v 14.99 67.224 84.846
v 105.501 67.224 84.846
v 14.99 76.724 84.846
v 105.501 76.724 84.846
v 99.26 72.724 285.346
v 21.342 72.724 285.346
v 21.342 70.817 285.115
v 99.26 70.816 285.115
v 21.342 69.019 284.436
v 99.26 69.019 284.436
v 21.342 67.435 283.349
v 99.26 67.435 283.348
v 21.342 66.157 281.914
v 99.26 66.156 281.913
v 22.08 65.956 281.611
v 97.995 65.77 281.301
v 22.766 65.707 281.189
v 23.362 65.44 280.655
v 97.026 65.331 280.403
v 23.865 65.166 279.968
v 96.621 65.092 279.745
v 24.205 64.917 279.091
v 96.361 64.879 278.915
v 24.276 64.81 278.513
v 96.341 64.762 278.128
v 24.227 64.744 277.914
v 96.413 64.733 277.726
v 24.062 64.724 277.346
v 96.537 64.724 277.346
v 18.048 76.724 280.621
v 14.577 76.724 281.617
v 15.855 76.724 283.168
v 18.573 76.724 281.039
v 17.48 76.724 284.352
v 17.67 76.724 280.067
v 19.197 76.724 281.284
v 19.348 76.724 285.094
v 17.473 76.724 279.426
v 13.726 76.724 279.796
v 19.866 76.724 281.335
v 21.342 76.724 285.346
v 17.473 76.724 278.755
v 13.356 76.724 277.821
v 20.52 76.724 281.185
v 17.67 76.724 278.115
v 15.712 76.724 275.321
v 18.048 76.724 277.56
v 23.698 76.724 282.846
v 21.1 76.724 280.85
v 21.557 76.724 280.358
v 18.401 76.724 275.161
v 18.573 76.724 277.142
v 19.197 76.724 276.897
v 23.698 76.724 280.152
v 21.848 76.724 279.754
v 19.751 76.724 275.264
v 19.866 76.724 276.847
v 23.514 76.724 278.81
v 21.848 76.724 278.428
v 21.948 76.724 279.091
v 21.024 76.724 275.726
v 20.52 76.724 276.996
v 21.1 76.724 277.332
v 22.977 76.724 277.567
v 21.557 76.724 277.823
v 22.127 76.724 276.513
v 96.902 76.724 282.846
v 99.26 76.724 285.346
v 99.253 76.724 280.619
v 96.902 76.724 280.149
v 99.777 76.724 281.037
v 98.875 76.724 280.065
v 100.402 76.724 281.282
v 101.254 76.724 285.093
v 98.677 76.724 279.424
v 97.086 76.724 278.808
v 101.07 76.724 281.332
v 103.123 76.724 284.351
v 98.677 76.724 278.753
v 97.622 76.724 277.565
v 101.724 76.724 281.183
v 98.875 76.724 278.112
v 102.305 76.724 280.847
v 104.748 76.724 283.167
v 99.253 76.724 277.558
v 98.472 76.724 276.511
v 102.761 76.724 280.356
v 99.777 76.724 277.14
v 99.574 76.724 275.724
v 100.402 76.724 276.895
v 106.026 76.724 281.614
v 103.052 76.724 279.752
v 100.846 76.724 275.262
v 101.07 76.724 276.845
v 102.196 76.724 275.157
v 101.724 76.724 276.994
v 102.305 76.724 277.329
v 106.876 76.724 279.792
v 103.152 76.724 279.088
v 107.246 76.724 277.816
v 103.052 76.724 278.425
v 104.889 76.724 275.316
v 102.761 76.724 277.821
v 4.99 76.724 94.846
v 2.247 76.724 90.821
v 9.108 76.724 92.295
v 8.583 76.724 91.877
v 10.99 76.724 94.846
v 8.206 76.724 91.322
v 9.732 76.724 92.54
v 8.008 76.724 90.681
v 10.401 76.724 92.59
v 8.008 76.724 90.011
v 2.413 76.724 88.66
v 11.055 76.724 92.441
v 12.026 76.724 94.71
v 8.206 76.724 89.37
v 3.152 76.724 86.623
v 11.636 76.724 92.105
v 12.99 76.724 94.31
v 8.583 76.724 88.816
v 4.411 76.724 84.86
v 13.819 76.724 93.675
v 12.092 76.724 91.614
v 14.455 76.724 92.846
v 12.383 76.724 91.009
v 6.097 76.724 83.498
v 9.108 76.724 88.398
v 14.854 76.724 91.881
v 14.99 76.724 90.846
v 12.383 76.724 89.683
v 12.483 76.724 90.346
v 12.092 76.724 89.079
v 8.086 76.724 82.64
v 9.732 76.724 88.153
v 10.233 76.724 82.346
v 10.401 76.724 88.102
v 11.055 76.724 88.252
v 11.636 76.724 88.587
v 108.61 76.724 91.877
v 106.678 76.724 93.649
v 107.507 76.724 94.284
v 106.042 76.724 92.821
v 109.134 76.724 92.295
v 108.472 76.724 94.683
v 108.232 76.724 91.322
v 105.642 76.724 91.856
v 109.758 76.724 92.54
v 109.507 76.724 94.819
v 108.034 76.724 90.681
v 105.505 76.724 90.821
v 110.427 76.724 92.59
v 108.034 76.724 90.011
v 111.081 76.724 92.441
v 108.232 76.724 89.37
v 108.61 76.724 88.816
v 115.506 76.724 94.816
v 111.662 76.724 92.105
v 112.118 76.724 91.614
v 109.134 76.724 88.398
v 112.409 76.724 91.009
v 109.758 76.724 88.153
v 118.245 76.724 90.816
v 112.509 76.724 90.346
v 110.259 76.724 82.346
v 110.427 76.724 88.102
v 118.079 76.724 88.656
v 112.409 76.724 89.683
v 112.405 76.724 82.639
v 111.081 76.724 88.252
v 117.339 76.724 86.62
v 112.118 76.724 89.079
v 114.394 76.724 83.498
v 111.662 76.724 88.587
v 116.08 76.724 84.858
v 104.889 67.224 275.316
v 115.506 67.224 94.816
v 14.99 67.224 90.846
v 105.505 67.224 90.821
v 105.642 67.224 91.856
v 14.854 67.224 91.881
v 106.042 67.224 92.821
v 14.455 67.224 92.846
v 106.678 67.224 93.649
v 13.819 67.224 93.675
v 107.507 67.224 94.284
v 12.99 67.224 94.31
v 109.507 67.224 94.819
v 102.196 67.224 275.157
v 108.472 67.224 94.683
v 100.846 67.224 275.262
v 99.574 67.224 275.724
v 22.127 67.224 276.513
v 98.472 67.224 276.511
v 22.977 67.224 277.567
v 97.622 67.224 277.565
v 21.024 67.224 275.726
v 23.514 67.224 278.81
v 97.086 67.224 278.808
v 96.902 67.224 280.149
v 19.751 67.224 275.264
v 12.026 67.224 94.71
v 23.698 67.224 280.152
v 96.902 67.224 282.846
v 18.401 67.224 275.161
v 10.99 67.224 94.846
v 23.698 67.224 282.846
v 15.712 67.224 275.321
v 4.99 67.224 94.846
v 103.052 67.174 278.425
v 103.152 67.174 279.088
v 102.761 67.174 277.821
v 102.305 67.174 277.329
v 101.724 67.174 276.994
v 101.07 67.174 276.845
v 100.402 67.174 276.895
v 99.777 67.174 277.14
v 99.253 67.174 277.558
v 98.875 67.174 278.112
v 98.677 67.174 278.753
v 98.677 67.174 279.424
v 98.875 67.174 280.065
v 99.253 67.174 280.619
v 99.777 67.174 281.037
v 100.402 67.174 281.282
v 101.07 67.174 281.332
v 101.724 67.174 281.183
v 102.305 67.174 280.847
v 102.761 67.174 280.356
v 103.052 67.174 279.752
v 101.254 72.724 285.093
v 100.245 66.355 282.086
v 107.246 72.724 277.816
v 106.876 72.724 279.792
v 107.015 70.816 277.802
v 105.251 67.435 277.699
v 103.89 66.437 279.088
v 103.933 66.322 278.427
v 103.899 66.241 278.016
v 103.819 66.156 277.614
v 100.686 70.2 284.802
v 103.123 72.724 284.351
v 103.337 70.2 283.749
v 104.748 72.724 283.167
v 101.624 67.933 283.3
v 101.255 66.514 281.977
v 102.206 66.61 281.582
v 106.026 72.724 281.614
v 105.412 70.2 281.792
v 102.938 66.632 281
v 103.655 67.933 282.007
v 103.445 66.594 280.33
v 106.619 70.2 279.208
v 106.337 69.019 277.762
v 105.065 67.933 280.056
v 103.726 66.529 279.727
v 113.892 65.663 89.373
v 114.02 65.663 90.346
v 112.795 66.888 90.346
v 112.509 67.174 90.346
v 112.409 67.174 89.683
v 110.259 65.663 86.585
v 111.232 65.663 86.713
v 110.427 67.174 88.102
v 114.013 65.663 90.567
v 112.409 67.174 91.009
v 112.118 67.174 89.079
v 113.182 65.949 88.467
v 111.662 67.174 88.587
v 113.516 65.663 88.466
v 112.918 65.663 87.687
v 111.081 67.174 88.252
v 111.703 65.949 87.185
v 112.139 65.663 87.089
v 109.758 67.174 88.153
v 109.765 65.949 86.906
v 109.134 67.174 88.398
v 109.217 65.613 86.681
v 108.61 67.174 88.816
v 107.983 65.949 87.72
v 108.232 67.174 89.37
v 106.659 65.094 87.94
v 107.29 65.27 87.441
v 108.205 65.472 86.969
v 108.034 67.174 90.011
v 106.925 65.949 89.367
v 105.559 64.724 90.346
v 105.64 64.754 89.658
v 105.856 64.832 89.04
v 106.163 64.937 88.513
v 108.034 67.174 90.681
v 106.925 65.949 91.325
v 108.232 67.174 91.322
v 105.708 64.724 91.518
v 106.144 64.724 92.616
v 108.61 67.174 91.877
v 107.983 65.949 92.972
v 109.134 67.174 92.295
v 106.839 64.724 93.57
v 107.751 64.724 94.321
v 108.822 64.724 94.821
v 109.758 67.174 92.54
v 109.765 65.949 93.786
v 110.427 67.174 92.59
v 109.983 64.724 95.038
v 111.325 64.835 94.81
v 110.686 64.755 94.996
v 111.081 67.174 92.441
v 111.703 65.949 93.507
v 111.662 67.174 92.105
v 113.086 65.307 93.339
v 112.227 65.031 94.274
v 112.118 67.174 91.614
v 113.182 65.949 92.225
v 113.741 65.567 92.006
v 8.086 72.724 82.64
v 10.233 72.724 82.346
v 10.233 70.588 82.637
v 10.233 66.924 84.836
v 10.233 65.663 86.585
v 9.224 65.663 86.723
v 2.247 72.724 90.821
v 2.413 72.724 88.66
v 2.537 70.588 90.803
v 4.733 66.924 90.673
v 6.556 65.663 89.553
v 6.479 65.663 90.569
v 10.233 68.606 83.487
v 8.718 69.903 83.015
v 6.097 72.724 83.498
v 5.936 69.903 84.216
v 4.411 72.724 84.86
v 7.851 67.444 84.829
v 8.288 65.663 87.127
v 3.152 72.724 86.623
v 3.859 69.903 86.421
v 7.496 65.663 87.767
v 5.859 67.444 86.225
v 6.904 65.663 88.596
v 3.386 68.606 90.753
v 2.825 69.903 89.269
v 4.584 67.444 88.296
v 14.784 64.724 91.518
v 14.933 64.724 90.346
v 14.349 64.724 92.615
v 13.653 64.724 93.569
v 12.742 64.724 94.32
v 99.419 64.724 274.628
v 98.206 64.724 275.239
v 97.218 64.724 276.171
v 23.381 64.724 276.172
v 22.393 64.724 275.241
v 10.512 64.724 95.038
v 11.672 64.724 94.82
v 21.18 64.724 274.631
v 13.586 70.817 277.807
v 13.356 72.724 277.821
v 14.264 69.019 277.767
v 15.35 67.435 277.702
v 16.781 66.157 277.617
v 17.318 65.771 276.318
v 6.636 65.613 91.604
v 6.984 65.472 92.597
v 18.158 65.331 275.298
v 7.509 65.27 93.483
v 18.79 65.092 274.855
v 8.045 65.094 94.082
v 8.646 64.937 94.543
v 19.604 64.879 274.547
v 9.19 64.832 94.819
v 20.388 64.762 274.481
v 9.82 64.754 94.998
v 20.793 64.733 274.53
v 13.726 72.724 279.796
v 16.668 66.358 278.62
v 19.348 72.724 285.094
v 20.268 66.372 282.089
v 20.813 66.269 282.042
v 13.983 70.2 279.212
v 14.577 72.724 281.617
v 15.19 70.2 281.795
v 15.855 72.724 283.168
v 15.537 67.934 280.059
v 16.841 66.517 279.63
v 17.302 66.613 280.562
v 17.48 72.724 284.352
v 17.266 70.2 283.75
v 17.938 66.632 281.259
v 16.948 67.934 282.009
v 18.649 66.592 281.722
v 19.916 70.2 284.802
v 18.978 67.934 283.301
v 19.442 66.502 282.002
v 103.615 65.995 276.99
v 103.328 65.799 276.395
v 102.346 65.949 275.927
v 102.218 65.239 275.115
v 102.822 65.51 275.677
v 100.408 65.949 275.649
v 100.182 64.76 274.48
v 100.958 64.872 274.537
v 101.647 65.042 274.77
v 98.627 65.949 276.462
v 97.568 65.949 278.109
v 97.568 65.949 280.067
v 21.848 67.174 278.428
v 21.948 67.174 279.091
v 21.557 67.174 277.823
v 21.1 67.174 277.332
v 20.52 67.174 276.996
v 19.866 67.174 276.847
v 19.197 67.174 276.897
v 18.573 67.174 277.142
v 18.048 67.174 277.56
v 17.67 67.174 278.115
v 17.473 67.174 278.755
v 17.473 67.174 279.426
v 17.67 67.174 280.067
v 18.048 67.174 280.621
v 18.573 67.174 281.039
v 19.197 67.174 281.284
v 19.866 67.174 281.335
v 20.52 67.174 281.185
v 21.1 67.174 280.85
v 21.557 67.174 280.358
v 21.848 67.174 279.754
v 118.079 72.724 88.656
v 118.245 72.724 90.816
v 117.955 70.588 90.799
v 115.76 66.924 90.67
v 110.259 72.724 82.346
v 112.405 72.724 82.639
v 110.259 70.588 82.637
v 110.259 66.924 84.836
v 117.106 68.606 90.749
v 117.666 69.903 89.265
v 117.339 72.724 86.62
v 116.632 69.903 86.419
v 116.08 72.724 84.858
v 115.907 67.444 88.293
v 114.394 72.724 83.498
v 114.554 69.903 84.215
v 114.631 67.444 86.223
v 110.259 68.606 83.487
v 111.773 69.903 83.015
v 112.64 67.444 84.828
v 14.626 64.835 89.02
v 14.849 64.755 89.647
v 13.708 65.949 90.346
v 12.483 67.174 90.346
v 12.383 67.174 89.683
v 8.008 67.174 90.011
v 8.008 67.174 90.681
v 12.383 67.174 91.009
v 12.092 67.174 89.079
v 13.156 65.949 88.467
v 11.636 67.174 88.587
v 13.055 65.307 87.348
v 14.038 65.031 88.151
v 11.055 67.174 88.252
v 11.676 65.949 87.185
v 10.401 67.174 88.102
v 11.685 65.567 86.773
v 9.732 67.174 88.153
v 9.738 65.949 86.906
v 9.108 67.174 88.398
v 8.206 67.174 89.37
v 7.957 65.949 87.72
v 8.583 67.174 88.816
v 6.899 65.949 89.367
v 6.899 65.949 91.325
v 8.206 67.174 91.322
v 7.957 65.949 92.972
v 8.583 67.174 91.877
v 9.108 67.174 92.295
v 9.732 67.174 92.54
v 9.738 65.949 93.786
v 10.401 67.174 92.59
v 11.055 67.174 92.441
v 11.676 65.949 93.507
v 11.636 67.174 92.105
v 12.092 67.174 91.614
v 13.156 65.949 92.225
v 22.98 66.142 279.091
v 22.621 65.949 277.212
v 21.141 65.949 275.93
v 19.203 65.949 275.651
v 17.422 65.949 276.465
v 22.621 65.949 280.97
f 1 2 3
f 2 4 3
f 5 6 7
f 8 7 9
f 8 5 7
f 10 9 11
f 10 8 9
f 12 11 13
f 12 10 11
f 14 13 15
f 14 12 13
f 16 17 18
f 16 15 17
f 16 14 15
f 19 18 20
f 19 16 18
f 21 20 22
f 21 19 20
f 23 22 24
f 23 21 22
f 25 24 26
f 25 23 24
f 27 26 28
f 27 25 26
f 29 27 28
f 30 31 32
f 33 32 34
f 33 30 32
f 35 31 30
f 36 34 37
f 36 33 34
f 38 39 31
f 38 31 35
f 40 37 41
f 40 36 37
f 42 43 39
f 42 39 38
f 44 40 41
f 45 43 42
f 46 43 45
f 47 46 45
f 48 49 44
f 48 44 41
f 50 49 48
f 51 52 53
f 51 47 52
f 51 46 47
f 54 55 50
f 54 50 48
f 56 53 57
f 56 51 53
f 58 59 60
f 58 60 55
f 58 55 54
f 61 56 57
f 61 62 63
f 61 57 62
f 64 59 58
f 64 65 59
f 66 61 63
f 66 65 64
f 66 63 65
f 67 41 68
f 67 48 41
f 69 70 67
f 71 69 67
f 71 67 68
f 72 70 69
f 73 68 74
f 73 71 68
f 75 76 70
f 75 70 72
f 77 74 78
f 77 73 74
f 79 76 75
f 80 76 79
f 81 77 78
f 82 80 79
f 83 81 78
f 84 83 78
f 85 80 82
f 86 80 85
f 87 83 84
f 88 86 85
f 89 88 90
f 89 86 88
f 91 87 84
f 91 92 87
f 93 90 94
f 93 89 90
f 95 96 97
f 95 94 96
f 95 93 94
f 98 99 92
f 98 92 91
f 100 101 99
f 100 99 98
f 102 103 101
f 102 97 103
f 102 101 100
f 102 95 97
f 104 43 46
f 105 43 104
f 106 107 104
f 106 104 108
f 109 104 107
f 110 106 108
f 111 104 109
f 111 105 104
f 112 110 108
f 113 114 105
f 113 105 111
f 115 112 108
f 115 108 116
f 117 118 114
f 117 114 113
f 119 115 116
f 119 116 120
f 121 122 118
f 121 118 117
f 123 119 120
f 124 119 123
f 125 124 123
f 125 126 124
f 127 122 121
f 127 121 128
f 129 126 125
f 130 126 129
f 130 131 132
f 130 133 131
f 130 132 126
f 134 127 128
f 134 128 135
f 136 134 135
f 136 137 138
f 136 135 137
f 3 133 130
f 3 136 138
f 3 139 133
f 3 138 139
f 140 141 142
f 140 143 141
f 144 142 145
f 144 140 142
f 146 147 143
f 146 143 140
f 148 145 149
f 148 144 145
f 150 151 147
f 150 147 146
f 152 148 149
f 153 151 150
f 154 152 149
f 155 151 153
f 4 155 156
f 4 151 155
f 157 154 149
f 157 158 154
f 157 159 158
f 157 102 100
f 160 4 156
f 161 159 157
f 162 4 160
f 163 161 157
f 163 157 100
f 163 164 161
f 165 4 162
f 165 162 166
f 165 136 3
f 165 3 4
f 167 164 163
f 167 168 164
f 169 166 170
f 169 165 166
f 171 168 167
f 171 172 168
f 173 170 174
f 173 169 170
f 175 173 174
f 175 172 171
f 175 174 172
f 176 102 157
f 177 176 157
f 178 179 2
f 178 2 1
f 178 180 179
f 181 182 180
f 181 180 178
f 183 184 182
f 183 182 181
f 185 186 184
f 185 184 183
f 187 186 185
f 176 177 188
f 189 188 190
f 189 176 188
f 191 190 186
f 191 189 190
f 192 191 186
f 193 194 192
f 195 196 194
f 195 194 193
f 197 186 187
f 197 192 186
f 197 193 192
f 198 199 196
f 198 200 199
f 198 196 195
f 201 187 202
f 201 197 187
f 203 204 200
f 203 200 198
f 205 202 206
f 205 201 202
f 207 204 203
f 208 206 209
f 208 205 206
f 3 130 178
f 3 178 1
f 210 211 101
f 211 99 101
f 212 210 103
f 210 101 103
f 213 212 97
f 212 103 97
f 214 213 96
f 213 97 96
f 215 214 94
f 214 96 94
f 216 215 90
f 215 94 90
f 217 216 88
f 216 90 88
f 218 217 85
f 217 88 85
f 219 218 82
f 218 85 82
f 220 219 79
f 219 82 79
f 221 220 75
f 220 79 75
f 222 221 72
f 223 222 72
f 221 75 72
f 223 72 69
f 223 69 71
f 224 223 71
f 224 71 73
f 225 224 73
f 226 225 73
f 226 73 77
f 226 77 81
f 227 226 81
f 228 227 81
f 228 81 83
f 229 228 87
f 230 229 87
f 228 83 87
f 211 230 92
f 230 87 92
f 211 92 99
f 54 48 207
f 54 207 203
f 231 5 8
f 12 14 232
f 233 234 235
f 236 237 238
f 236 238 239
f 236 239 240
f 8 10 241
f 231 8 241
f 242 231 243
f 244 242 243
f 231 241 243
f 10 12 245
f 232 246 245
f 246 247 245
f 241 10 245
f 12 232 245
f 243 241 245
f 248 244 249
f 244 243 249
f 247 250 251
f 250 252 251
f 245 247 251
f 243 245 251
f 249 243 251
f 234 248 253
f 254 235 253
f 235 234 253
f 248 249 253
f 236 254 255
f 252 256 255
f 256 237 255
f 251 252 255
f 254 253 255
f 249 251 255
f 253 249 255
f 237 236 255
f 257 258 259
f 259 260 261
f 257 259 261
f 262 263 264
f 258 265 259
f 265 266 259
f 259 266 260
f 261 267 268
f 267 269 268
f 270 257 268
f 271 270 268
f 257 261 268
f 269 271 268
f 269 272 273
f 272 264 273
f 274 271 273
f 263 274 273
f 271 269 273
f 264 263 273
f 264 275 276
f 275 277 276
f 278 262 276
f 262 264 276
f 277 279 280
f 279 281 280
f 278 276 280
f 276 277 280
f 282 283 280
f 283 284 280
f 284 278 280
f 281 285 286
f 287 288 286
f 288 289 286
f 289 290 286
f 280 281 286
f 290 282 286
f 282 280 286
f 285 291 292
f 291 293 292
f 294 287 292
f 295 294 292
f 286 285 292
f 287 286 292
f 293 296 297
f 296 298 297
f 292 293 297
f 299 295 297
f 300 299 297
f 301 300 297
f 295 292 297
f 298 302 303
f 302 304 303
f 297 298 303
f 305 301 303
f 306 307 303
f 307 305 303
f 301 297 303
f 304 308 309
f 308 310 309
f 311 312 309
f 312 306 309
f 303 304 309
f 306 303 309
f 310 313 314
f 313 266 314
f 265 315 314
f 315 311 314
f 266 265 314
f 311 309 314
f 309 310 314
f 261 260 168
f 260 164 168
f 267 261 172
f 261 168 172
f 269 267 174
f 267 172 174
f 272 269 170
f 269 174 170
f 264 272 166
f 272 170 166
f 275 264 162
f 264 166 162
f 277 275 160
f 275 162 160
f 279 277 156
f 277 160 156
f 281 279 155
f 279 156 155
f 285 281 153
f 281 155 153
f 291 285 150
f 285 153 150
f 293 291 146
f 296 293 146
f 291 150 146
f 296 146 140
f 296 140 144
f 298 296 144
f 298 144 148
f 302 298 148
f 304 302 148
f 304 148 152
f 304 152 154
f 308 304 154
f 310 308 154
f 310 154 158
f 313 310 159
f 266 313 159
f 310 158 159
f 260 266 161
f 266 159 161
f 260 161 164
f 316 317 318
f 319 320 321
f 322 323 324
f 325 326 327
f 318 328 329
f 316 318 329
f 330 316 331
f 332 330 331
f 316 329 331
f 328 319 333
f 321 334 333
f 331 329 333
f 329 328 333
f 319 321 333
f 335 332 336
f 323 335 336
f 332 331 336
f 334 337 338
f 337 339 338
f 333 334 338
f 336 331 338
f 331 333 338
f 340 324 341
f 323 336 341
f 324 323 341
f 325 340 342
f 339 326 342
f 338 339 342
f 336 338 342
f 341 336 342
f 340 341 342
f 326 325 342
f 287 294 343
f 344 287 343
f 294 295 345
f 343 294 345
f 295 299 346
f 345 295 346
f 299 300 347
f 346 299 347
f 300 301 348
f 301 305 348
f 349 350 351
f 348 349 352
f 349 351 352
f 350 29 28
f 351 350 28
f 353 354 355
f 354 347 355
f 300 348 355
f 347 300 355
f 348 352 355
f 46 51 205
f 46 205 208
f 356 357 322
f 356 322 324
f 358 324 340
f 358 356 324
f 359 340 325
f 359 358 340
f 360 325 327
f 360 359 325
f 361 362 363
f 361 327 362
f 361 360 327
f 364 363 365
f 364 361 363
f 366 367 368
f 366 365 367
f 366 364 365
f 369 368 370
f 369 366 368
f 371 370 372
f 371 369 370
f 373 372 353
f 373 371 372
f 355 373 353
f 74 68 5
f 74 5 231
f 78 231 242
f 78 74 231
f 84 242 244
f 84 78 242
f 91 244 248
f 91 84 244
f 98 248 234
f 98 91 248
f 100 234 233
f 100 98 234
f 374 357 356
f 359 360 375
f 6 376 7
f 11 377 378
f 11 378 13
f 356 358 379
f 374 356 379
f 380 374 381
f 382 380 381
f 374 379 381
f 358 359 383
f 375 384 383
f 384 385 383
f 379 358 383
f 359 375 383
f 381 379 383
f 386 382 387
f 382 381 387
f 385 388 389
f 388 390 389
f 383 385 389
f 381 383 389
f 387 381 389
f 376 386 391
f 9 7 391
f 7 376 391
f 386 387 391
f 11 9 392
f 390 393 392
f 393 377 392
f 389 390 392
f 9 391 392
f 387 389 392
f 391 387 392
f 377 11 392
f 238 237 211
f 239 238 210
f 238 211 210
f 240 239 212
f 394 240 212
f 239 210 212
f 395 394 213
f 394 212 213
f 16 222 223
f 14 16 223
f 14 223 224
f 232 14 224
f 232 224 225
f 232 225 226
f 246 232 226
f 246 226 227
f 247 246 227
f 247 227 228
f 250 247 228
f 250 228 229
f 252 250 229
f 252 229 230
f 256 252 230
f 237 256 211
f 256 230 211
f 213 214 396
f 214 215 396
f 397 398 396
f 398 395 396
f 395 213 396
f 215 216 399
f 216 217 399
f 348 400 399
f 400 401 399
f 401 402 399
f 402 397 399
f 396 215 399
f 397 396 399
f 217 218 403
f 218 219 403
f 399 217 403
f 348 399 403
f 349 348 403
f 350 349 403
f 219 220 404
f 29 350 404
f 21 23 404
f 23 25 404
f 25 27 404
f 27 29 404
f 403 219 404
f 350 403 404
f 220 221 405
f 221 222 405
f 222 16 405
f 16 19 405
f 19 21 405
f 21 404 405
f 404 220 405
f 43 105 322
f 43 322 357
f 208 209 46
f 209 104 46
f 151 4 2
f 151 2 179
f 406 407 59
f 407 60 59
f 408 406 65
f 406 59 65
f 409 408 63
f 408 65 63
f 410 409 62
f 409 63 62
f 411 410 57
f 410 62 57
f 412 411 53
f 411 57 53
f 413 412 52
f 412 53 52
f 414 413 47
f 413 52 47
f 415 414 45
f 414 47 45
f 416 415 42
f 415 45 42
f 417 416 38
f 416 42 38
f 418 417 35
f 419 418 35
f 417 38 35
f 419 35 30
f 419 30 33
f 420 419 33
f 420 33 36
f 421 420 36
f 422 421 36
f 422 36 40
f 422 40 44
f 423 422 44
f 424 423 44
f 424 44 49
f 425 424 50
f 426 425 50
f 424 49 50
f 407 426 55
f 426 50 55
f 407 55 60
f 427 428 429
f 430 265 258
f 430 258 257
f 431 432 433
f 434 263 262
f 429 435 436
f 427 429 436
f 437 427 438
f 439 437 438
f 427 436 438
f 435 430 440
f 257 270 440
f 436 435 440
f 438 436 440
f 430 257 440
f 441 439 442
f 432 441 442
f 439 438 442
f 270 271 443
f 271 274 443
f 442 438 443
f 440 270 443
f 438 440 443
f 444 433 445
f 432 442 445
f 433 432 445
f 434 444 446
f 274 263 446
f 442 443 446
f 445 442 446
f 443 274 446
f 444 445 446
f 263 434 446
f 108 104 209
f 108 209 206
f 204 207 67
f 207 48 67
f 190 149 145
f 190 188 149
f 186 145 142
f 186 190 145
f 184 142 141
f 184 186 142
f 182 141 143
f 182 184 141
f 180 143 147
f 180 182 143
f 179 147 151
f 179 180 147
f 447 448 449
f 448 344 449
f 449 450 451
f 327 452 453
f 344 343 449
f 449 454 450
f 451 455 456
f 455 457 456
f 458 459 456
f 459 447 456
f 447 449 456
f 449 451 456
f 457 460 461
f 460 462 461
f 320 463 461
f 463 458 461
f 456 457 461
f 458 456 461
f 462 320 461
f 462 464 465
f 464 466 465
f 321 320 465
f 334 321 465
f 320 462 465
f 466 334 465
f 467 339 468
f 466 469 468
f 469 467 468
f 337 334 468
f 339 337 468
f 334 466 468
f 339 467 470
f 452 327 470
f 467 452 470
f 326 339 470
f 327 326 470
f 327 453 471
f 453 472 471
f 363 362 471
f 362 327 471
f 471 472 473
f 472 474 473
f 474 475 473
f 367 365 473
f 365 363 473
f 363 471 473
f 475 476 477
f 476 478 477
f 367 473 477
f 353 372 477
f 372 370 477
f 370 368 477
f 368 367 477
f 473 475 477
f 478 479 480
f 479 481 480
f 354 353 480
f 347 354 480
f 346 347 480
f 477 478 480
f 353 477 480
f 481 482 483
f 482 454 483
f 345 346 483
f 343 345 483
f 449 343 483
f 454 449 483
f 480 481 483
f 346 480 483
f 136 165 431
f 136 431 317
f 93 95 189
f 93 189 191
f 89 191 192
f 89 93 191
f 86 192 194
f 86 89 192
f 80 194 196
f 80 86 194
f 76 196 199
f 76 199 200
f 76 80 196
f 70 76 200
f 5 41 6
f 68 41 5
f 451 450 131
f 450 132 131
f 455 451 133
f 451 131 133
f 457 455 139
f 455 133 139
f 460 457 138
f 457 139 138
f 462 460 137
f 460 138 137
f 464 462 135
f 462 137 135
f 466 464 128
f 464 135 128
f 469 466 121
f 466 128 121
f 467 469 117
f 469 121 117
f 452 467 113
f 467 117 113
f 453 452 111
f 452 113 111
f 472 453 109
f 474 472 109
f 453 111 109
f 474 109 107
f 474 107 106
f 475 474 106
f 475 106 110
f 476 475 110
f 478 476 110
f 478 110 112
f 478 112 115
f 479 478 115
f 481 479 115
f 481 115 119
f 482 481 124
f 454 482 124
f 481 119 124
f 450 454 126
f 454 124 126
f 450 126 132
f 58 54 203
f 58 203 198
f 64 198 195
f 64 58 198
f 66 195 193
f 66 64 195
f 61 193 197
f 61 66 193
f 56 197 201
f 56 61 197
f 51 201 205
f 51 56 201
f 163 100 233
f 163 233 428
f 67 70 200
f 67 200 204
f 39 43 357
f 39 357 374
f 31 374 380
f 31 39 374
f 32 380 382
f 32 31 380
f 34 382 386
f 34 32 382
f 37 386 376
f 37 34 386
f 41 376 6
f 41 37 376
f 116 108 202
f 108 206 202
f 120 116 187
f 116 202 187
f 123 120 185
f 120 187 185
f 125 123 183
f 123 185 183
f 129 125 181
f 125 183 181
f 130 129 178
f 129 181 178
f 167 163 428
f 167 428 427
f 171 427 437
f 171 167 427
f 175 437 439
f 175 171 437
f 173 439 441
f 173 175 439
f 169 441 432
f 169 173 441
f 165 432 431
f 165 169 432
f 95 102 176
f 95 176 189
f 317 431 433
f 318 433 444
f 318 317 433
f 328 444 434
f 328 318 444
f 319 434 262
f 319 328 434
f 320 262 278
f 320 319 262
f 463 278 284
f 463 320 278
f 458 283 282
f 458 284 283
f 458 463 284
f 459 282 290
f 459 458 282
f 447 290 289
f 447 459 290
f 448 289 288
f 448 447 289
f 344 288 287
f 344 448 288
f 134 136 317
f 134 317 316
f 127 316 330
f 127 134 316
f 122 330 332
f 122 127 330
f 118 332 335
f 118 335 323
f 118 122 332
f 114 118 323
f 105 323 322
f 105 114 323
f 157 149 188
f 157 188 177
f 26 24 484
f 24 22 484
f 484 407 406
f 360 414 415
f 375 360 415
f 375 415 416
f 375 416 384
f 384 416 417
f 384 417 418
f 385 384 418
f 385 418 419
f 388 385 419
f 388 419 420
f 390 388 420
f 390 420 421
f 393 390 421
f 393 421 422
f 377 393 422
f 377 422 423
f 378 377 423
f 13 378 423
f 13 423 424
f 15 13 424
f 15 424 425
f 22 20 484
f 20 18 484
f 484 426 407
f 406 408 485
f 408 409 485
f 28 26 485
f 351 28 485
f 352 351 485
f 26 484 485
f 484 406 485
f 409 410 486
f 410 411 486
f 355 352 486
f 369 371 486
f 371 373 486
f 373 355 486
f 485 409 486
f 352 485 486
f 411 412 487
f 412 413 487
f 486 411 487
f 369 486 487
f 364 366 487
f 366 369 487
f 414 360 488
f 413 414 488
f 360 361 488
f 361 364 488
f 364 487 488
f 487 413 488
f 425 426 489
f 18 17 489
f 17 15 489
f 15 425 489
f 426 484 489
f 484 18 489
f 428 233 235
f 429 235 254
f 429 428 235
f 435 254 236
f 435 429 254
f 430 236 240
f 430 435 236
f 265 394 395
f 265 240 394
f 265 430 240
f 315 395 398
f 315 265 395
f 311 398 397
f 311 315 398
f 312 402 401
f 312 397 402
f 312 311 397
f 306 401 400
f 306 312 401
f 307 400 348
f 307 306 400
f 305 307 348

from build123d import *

# Parameters (mm, degrees)
BOSS_EXTRUDE1_DEPTH                                 = 12
SHELL1_T                                            = -2.5
FILLET2_R                                           = 8
SKETCH5_R                                           = 1.5
BOSS_EXTRUDE3_DEPTH                                 = 9.5
FILLET5_R                                           = 4
CSK_FOR_M4_COUNTERSUNK_FLAT_HEAD_SCREW1_D           = 4.5
CSK_FOR_M4_COUNTERSUNK_FLAT_HEAD_SCREW1_CSINK_D     = 9.4
CSK_FOR_M4_COUNTERSUNK_FLAT_HEAD_SCREW1_CSINK_ANGLE = 90
CSK_FOR_M4_COUNTERSUNK_FLAT_HEAD_SCREW2_D           = 4.5
CSK_FOR_M4_COUNTERSUNK_FLAT_HEAD_SCREW2_CSINK_D     = 9.4
CSK_FOR_M4_COUNTERSUNK_FLAT_HEAD_SCREW2_CSINK_ANGLE = 90


with BuildPart() as part:
    # Sketch1 → Boss-Extrude1 (new body)
    with BuildSketch(Plane.XZ.offset(-76.724152422)):
        with BuildLine():
            Line((110.259063934, 82.346126643), (10.232808146, 82.346126643))
            ThreePointArc((10.232808146, 82.346126643), (4.41063977, 84.859565296), (2.246887156, 90.820537791))
            Line((2.246887156, 90.820537791), (13.35579753, 277.820529099))
            ThreePointArc((13.35579753, 277.820529099), (15.855157174, 283.168286326), (21.341718521, 285.346117951))
            Line((21.341718521, 285.346117951), (99.259600005, 285.346117951))
            ThreePointArc((99.259600005, 285.346117951), (104.747858971, 283.166686096), (107.245796332, 277.815871333))
            Line((107.245796332, 277.815871333), (118.24526026, 90.815880025))
            ThreePointArc((118.24526026, 90.815880025), (116.079632079, 84.857867678), (110.259063934, 82.346126643))
        make_face()
    extrude(amount=BOSS_EXTRUDE1_DEPTH)

    # Shell1
    shell1_openings = [part.faces().sort_by_distance(p)[0] for p in [
        (60.272055657, 76.724152422, 180.004596884),
    ]]
    offset(amount=SHELL1_T, openings=shell1_openings, kind=Kind.INTERSECTION)

    # Fillet2
    fillet2_edges = [part.edges().sort_by_distance(p)[0] for p in [
        (104.747858971, 64.724152422, 283.166686096),
        (60.300659263, 64.724152422, 285.346117951),
        (15.855157174, 64.724152422, 283.168286326),
        (7.801342343, 64.724152422, 184.320533445),
        (4.41063977, 64.724152422, 84.859565296),
        (60.24593604, 64.724152422, 82.346126643),
        (116.079632079, 64.724152422, 84.857867678),
        (112.745528296, 64.724152422, 184.315875679),
    ]]
    fillet(fillet2_edges, radius=FILLET2_R)

    # Sketch5 → Boss-Extrude3 (add)
    # profile 1 of 4: a face of its own
    with BuildSketch(Plane(origin=(0, 76.724152422, 0), x_dir=(1, 0, 0), z_dir=(0, 1, 0))):
        with BuildLine():
            Line((104.888526891, -275.315871333), (102.195926429, -275.157490782))
            ThreePointArc((102.195926429, -275.157490782), (98.472168712, -276.511008395), (96.902330565, -280.148863486))
            Line((96.902330565, -280.148863486), (96.902330565, -282.846117951))
            Line((96.902330565, -282.846117951), (99.259600005, -282.846117951))
            ThreePointArc((99.259600005, -282.846117951), (103.032778044, -281.34775855), (104.75010998, -277.669073401))
            Line((104.75010998, -277.669073401), (104.888526891, -275.315871333))
        make_face()
        with Locations(Location((100.902330565, -279.088314379, 0), (0, 0, 270))):
            Circle(SKETCH5_R, mode=Mode.SUBTRACT)
    # profile 2 of 4: a face of its own
    with BuildSketch(Plane(origin=(0, 76.724152422, 0), x_dir=(1, 0, 0), z_dir=(0, 1, 0))):
        with BuildLine():
            Line((18.401104149, -275.160761929), (15.711690126, -275.320529099))
            Line((15.711690126, -275.320529099), (15.85139784, -277.672275615))
            ThreePointArc((15.85139784, -277.672275615), (17.569707595, -281.348858709), (21.341718521, -282.846117951))
            Line((21.341718521, -282.846117951), (23.697611116, -282.846117951))
            Line((23.697611116, -282.846117951), (23.697611116, -280.151962548))
            ThreePointArc((23.697611116, -280.151962548), (22.126711958, -276.513107313), (18.401104149, -275.160761929))
        make_face()
        with Locations(Location((19.697611116, -279.090793629, 0), (0, 0, 270))):
            Circle(SKETCH5_R, mode=Mode.SUBTRACT)
    # profile 3 of 4: a face of its own
    with BuildSketch(Plane(origin=(0, 76.724152422, 0), x_dir=(1, 0, 0), z_dir=(0, 1, 0))):
        with BuildLine():
            Line((14.990438495, -84.846126643), (10.232808146, -84.846126643))
            ThreePointArc((10.232808146, -84.846126643), (6.230067388, -86.574115717), (4.742487465, -90.672284307))
            Line((4.742487465, -90.672284307), (4.990438495, -94.846126643))
            Line((4.990438495, -94.846126643), (14.990438495, -94.846126643))
            Line((14.990438495, -94.846126643), (14.990438495, -84.846126643))
        make_face()
        with Locations(Location((10.232808146, -90.346126643, 0), (0, 0, 270))):
            Circle(SKETCH5_R, mode=Mode.SUBTRACT)
    # profile 4 of 4: a face of its own
    with BuildSketch(Plane(origin=(0, 76.724152422, 0), x_dir=(1, 0, 0), z_dir=(0, 1, 0))):
        with BuildLine():
            Line((105.501426671, -84.821111223), (105.506954269, -94.821109695))
            Line((105.506954269, -94.821109695), (115.506952742, -94.815582097))
            Line((115.506952742, -94.815582097), (115.752596601, -90.641603341))
            ThreePointArc((115.752596601, -90.641603341), (114.262751603, -86.544257652), (110.259056293, -84.818481396))
            Line((110.259056293, -84.818481396), (105.501426671, -84.821111223))
        make_face()
        with Locations(Location((110.259063934, -90.346126643, 0), (0, 0, 270))):
            Circle(SKETCH5_R, mode=Mode.SUBTRACT)
    extrude(amount=-BOSS_EXTRUDE3_DEPTH)

    # Fillet5
    fillet5_edges = [part.edges().sort_by_distance(p)[0] for p in [
        (14.990438495, 71.974152422, 94.846126643),
        (105.506954269, 71.974152422, 94.821109695),
    ]]
    fillet(fillet5_edges, radius=FILLET5_R)

    # CSK for M4 Countersunk Flat Head Screw1 (through all)
    with Locations(Plane(origin=(0, 64.724152422, 0), x_dir=(-1, 0, 0), z_dir=(0, -1, 0))):
        with Locations((-10.232808146, -90.346126643), (-110.259063934, -90.346126643)):
            CounterSinkHole(CSK_FOR_M4_COUNTERSUNK_FLAT_HEAD_SCREW1_D / 2, CSK_FOR_M4_COUNTERSUNK_FLAT_HEAD_SCREW1_CSINK_D / 2, counter_sink_angle=CSK_FOR_M4_COUNTERSUNK_FLAT_HEAD_SCREW1_CSINK_ANGLE)

    # CSK for M4 Countersunk Flat Head Screw2 (through all)
    with Locations(Plane(origin=(0, 64.724152422, 0), x_dir=(-1, 0, 0), z_dir=(0, -1, 0))):
        with Locations((-100.902330565, -279.088314379), (-19.697611116, -279.090793629)):
            CounterSinkHole(CSK_FOR_M4_COUNTERSUNK_FLAT_HEAD_SCREW2_D / 2, CSK_FOR_M4_COUNTERSUNK_FLAT_HEAD_SCREW2_CSINK_D / 2, counter_sink_angle=CSK_FOR_M4_COUNTERSUNK_FLAT_HEAD_SCREW2_CSINK_ANGLE)


solid = part.part
